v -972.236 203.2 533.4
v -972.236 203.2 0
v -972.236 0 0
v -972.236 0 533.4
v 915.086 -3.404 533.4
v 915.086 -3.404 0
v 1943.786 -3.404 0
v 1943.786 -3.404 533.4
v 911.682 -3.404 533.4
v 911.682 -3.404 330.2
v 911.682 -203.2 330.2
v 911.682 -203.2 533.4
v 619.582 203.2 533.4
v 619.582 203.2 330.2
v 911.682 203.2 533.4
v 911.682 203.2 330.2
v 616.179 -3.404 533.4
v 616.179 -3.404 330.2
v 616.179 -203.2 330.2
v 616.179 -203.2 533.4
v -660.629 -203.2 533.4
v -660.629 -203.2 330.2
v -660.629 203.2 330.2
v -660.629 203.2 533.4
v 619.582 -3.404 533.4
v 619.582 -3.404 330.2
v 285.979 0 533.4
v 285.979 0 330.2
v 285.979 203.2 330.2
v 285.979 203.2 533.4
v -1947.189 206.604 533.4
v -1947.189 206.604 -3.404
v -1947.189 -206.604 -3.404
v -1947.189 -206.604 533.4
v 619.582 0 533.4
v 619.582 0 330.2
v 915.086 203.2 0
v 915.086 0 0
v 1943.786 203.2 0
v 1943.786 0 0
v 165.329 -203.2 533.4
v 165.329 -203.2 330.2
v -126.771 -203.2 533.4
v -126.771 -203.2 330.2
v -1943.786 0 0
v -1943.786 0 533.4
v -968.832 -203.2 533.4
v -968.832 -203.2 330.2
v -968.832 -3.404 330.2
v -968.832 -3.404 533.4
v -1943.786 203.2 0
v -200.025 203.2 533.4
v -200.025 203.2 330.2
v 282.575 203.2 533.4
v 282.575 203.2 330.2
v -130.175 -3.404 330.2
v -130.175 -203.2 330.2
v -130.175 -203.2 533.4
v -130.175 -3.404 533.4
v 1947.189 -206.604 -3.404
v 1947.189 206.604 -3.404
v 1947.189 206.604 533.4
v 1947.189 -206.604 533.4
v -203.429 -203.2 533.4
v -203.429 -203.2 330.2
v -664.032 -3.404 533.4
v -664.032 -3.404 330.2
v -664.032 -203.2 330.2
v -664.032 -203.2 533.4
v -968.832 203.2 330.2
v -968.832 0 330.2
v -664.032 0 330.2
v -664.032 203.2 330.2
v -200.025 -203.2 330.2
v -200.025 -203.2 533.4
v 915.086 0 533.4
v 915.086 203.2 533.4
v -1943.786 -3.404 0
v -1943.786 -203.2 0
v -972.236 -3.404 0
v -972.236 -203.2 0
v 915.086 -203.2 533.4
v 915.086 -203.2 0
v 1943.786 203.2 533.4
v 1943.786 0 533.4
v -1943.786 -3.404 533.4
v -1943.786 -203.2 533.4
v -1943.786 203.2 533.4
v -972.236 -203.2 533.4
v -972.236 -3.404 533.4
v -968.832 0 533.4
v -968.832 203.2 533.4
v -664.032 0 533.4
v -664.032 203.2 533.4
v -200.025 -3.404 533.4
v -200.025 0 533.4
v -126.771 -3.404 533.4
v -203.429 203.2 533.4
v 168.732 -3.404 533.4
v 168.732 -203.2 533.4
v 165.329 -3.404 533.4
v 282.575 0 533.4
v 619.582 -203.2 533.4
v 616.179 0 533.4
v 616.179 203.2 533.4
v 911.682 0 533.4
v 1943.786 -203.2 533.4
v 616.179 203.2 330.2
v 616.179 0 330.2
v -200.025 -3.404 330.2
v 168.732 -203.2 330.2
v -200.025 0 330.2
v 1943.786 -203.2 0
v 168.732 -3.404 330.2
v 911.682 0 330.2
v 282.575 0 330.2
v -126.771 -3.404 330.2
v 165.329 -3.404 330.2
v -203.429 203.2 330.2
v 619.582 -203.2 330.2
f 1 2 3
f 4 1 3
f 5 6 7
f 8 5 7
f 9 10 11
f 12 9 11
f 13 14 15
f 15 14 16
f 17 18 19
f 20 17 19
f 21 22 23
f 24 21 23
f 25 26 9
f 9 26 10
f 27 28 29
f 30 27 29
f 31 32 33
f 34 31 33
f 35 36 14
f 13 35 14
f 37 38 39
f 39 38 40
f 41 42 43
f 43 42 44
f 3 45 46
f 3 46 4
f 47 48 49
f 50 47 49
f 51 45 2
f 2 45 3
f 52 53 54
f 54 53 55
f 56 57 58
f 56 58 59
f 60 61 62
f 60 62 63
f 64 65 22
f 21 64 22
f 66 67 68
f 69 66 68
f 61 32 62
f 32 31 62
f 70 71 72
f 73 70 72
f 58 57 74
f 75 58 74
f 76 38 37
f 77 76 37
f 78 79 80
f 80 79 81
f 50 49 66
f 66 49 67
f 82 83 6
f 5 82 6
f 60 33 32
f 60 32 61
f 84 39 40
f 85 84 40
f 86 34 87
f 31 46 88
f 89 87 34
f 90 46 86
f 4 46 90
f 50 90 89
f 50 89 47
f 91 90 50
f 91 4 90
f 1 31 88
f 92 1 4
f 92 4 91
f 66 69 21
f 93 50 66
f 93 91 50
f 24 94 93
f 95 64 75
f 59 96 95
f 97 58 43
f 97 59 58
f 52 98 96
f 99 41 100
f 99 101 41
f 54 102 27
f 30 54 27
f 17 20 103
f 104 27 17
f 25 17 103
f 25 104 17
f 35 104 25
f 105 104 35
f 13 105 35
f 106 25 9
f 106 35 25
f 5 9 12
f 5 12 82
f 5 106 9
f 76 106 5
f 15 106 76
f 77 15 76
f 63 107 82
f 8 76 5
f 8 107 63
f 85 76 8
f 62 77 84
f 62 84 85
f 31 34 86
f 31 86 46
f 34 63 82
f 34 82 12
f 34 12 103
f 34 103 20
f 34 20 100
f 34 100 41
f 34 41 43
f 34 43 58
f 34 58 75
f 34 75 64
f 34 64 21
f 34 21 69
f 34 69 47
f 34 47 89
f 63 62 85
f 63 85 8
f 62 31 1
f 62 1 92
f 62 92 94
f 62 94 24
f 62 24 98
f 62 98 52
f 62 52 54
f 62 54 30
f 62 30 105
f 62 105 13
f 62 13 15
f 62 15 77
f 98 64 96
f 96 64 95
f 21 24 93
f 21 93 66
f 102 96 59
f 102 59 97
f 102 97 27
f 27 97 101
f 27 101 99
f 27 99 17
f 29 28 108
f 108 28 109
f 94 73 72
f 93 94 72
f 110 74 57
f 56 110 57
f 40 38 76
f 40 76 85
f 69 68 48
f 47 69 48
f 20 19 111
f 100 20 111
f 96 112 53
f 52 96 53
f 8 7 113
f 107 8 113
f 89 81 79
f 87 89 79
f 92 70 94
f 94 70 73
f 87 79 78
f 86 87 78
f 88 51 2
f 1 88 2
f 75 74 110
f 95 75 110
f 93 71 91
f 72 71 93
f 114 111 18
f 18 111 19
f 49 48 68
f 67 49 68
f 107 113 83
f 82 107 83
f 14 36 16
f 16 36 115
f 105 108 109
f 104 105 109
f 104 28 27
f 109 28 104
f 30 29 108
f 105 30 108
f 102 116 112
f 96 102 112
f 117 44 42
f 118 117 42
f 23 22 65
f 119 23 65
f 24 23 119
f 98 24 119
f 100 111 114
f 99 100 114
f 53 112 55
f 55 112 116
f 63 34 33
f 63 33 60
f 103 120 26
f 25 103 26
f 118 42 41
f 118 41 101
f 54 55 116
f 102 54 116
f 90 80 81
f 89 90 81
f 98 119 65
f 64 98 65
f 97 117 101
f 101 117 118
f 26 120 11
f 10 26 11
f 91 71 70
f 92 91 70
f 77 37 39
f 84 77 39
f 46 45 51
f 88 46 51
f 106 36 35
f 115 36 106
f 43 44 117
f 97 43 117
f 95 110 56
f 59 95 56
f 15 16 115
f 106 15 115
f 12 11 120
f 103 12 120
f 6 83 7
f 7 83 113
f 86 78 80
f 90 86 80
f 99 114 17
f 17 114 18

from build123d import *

# Parameters (mm, degrees)
F0_W     = 3894.3788
F0_H     = 413.2072
F0_W_2   = 971.55
F0_H_2   = 3.4036
F0_W_3   = 304.8
F0_W_4   = 3.4036
F0_H_3   = 199.7964
F0_W_5   = 330.2
F0_W_6   = 292.1
F0_W_7   = 1028.7
F1_DEPTH = 533.4
F2_W     = 3894.3788
F2_H     = 413.2072
F3_DEPTH = 3.4036
F4_DEPTH = 330.2


with BuildPart() as f1:
    # F0 (on Top) → F1 (new body)
    with BuildSketch(Plane.XY):
        Rectangle(F0_W, F0_H)
        Polygon((-1943.7858, 0), (-1943.7858, 203.2), (-972.2358, 203.2), (-968.8322, 203.2), (-664.0322, 203.2), (-660.6286, 203.2), (-203.4286, 203.2), (-200.025, 203.2), (282.575, 203.2), (285.9786, 203.2), (616.1786, 203.2), (619.5822, 203.2), (911.6822, 203.2), (915.0858, 203.2), (1943.7858, 203.2), (1943.7858, 0), (1943.7858, -3.4036), (1943.7858, -203.2), (915.0858, -203.2), (911.6822, -203.2), (619.5822, -203.2), (616.1786, -203.2), (168.7322, -203.2), (165.3286, -203.2), (-126.7714, -203.2), (-130.175, -203.2), (-200.025, -203.2), (-203.4286, -203.2), (-660.6286, -203.2), (-664.0322, -203.2), (-968.8322, -203.2), (-972.2358, -203.2), (-1943.7858, -203.2), (-1943.7858, -3.4036), align=None, mode=Mode.SUBTRACT)
        with Locations((-1458.0108, -1.7018)):
            Rectangle(F0_W_2, F0_H_2)
        Polygon((-968.8322, 203.2), (-972.2358, 203.2), (-972.2358, 0), (-972.2358, -3.4036), (-972.2358, -203.2), (-968.8322, -203.2), (-968.8322, -3.4036), (-968.8322, 0), align=None)
        with Locations((-816.4322, -1.7018)):
            Rectangle(F0_W_3, F0_H_2)
        Polygon((-660.6286, 203.2), (-664.0322, 203.2), (-664.0322, 0), (-664.0322, -3.4036), (-664.0322, -203.2), (-660.6286, -203.2), align=None)
        Polygon((-200.025, 203.2), (-203.4286, 203.2), (-203.4286, -203.2), (-200.025, -203.2), (-200.025, -3.4036), (-200.025, 0), align=None)
        Polygon((282.575, 0), (-200.025, 0), (-200.025, -3.4036), (-130.175, -3.4036), (-126.7714, -3.4036), (165.3286, -3.4036), (168.7322, -3.4036), (282.575, -3.4036), align=None)
        with Locations((-128.4732, -103.3018)):
            Rectangle(F0_W_4, F0_H_3)
        with Locations((167.0304, -103.3018)):
            Rectangle(F0_W_4, F0_H_3)
        Polygon((285.9786, 203.2), (282.575, 203.2), (282.575, 0), (282.575, -3.4036), (285.9786, -3.4036), (285.9786, 0), align=None)
        with Locations((451.0786, -1.7018)):
            Rectangle(F0_W_5, F0_H_2)
        Polygon((619.5822, 203.2), (616.1786, 203.2), (616.1786, 0), (616.1786, -3.4036), (616.1786, -203.2), (619.5822, -203.2), (619.5822, -3.4036), (619.5822, 0), align=None)
        with Locations((765.6322, -1.7018)):
            Rectangle(F0_W_6, F0_H_2)
        Polygon((915.0858, 203.2), (911.6822, 203.2), (911.6822, 0), (911.6822, -3.4036), (911.6822, -203.2), (915.0858, -203.2), (915.0858, -3.4036), (915.0858, 0), align=None)
        with Locations((1429.4358, -1.7018)):
            Rectangle(F0_W_7, F0_H_2)
    extrude(amount=F1_DEPTH)

    # F2 (on face) → F3 (join)
    with BuildSketch(Plane(origin=(0, 0, 0), x_dir=(1, 0, 0), z_dir=(0, 0, -1))):
        Rectangle(F2_W, F2_H)
    extrude(amount=F3_DEPTH)

    # F4 (add): faces of the model
    f4_faces = [f1.faces().sort_by_distance(p)[0] for p in [
        (765.6322, 101.6, 0),
        (765.6322, -103.3018, 0),
        (392.4554, -103.3018, 0),
        (451.0786, 101.6, 0),
        (41.275, 101.6, 0),
        (19.2786, -103.3018, 0),
        (-165.1, -103.3018, 0),
        (-432.0286, 0, 0),
        (-816.4322, 101.6, 0),
        (-816.4322, -103.3018, 0),
    ]]
    extrude(f4_faces, amount=F4_DEPTH)


solid = f1.part
